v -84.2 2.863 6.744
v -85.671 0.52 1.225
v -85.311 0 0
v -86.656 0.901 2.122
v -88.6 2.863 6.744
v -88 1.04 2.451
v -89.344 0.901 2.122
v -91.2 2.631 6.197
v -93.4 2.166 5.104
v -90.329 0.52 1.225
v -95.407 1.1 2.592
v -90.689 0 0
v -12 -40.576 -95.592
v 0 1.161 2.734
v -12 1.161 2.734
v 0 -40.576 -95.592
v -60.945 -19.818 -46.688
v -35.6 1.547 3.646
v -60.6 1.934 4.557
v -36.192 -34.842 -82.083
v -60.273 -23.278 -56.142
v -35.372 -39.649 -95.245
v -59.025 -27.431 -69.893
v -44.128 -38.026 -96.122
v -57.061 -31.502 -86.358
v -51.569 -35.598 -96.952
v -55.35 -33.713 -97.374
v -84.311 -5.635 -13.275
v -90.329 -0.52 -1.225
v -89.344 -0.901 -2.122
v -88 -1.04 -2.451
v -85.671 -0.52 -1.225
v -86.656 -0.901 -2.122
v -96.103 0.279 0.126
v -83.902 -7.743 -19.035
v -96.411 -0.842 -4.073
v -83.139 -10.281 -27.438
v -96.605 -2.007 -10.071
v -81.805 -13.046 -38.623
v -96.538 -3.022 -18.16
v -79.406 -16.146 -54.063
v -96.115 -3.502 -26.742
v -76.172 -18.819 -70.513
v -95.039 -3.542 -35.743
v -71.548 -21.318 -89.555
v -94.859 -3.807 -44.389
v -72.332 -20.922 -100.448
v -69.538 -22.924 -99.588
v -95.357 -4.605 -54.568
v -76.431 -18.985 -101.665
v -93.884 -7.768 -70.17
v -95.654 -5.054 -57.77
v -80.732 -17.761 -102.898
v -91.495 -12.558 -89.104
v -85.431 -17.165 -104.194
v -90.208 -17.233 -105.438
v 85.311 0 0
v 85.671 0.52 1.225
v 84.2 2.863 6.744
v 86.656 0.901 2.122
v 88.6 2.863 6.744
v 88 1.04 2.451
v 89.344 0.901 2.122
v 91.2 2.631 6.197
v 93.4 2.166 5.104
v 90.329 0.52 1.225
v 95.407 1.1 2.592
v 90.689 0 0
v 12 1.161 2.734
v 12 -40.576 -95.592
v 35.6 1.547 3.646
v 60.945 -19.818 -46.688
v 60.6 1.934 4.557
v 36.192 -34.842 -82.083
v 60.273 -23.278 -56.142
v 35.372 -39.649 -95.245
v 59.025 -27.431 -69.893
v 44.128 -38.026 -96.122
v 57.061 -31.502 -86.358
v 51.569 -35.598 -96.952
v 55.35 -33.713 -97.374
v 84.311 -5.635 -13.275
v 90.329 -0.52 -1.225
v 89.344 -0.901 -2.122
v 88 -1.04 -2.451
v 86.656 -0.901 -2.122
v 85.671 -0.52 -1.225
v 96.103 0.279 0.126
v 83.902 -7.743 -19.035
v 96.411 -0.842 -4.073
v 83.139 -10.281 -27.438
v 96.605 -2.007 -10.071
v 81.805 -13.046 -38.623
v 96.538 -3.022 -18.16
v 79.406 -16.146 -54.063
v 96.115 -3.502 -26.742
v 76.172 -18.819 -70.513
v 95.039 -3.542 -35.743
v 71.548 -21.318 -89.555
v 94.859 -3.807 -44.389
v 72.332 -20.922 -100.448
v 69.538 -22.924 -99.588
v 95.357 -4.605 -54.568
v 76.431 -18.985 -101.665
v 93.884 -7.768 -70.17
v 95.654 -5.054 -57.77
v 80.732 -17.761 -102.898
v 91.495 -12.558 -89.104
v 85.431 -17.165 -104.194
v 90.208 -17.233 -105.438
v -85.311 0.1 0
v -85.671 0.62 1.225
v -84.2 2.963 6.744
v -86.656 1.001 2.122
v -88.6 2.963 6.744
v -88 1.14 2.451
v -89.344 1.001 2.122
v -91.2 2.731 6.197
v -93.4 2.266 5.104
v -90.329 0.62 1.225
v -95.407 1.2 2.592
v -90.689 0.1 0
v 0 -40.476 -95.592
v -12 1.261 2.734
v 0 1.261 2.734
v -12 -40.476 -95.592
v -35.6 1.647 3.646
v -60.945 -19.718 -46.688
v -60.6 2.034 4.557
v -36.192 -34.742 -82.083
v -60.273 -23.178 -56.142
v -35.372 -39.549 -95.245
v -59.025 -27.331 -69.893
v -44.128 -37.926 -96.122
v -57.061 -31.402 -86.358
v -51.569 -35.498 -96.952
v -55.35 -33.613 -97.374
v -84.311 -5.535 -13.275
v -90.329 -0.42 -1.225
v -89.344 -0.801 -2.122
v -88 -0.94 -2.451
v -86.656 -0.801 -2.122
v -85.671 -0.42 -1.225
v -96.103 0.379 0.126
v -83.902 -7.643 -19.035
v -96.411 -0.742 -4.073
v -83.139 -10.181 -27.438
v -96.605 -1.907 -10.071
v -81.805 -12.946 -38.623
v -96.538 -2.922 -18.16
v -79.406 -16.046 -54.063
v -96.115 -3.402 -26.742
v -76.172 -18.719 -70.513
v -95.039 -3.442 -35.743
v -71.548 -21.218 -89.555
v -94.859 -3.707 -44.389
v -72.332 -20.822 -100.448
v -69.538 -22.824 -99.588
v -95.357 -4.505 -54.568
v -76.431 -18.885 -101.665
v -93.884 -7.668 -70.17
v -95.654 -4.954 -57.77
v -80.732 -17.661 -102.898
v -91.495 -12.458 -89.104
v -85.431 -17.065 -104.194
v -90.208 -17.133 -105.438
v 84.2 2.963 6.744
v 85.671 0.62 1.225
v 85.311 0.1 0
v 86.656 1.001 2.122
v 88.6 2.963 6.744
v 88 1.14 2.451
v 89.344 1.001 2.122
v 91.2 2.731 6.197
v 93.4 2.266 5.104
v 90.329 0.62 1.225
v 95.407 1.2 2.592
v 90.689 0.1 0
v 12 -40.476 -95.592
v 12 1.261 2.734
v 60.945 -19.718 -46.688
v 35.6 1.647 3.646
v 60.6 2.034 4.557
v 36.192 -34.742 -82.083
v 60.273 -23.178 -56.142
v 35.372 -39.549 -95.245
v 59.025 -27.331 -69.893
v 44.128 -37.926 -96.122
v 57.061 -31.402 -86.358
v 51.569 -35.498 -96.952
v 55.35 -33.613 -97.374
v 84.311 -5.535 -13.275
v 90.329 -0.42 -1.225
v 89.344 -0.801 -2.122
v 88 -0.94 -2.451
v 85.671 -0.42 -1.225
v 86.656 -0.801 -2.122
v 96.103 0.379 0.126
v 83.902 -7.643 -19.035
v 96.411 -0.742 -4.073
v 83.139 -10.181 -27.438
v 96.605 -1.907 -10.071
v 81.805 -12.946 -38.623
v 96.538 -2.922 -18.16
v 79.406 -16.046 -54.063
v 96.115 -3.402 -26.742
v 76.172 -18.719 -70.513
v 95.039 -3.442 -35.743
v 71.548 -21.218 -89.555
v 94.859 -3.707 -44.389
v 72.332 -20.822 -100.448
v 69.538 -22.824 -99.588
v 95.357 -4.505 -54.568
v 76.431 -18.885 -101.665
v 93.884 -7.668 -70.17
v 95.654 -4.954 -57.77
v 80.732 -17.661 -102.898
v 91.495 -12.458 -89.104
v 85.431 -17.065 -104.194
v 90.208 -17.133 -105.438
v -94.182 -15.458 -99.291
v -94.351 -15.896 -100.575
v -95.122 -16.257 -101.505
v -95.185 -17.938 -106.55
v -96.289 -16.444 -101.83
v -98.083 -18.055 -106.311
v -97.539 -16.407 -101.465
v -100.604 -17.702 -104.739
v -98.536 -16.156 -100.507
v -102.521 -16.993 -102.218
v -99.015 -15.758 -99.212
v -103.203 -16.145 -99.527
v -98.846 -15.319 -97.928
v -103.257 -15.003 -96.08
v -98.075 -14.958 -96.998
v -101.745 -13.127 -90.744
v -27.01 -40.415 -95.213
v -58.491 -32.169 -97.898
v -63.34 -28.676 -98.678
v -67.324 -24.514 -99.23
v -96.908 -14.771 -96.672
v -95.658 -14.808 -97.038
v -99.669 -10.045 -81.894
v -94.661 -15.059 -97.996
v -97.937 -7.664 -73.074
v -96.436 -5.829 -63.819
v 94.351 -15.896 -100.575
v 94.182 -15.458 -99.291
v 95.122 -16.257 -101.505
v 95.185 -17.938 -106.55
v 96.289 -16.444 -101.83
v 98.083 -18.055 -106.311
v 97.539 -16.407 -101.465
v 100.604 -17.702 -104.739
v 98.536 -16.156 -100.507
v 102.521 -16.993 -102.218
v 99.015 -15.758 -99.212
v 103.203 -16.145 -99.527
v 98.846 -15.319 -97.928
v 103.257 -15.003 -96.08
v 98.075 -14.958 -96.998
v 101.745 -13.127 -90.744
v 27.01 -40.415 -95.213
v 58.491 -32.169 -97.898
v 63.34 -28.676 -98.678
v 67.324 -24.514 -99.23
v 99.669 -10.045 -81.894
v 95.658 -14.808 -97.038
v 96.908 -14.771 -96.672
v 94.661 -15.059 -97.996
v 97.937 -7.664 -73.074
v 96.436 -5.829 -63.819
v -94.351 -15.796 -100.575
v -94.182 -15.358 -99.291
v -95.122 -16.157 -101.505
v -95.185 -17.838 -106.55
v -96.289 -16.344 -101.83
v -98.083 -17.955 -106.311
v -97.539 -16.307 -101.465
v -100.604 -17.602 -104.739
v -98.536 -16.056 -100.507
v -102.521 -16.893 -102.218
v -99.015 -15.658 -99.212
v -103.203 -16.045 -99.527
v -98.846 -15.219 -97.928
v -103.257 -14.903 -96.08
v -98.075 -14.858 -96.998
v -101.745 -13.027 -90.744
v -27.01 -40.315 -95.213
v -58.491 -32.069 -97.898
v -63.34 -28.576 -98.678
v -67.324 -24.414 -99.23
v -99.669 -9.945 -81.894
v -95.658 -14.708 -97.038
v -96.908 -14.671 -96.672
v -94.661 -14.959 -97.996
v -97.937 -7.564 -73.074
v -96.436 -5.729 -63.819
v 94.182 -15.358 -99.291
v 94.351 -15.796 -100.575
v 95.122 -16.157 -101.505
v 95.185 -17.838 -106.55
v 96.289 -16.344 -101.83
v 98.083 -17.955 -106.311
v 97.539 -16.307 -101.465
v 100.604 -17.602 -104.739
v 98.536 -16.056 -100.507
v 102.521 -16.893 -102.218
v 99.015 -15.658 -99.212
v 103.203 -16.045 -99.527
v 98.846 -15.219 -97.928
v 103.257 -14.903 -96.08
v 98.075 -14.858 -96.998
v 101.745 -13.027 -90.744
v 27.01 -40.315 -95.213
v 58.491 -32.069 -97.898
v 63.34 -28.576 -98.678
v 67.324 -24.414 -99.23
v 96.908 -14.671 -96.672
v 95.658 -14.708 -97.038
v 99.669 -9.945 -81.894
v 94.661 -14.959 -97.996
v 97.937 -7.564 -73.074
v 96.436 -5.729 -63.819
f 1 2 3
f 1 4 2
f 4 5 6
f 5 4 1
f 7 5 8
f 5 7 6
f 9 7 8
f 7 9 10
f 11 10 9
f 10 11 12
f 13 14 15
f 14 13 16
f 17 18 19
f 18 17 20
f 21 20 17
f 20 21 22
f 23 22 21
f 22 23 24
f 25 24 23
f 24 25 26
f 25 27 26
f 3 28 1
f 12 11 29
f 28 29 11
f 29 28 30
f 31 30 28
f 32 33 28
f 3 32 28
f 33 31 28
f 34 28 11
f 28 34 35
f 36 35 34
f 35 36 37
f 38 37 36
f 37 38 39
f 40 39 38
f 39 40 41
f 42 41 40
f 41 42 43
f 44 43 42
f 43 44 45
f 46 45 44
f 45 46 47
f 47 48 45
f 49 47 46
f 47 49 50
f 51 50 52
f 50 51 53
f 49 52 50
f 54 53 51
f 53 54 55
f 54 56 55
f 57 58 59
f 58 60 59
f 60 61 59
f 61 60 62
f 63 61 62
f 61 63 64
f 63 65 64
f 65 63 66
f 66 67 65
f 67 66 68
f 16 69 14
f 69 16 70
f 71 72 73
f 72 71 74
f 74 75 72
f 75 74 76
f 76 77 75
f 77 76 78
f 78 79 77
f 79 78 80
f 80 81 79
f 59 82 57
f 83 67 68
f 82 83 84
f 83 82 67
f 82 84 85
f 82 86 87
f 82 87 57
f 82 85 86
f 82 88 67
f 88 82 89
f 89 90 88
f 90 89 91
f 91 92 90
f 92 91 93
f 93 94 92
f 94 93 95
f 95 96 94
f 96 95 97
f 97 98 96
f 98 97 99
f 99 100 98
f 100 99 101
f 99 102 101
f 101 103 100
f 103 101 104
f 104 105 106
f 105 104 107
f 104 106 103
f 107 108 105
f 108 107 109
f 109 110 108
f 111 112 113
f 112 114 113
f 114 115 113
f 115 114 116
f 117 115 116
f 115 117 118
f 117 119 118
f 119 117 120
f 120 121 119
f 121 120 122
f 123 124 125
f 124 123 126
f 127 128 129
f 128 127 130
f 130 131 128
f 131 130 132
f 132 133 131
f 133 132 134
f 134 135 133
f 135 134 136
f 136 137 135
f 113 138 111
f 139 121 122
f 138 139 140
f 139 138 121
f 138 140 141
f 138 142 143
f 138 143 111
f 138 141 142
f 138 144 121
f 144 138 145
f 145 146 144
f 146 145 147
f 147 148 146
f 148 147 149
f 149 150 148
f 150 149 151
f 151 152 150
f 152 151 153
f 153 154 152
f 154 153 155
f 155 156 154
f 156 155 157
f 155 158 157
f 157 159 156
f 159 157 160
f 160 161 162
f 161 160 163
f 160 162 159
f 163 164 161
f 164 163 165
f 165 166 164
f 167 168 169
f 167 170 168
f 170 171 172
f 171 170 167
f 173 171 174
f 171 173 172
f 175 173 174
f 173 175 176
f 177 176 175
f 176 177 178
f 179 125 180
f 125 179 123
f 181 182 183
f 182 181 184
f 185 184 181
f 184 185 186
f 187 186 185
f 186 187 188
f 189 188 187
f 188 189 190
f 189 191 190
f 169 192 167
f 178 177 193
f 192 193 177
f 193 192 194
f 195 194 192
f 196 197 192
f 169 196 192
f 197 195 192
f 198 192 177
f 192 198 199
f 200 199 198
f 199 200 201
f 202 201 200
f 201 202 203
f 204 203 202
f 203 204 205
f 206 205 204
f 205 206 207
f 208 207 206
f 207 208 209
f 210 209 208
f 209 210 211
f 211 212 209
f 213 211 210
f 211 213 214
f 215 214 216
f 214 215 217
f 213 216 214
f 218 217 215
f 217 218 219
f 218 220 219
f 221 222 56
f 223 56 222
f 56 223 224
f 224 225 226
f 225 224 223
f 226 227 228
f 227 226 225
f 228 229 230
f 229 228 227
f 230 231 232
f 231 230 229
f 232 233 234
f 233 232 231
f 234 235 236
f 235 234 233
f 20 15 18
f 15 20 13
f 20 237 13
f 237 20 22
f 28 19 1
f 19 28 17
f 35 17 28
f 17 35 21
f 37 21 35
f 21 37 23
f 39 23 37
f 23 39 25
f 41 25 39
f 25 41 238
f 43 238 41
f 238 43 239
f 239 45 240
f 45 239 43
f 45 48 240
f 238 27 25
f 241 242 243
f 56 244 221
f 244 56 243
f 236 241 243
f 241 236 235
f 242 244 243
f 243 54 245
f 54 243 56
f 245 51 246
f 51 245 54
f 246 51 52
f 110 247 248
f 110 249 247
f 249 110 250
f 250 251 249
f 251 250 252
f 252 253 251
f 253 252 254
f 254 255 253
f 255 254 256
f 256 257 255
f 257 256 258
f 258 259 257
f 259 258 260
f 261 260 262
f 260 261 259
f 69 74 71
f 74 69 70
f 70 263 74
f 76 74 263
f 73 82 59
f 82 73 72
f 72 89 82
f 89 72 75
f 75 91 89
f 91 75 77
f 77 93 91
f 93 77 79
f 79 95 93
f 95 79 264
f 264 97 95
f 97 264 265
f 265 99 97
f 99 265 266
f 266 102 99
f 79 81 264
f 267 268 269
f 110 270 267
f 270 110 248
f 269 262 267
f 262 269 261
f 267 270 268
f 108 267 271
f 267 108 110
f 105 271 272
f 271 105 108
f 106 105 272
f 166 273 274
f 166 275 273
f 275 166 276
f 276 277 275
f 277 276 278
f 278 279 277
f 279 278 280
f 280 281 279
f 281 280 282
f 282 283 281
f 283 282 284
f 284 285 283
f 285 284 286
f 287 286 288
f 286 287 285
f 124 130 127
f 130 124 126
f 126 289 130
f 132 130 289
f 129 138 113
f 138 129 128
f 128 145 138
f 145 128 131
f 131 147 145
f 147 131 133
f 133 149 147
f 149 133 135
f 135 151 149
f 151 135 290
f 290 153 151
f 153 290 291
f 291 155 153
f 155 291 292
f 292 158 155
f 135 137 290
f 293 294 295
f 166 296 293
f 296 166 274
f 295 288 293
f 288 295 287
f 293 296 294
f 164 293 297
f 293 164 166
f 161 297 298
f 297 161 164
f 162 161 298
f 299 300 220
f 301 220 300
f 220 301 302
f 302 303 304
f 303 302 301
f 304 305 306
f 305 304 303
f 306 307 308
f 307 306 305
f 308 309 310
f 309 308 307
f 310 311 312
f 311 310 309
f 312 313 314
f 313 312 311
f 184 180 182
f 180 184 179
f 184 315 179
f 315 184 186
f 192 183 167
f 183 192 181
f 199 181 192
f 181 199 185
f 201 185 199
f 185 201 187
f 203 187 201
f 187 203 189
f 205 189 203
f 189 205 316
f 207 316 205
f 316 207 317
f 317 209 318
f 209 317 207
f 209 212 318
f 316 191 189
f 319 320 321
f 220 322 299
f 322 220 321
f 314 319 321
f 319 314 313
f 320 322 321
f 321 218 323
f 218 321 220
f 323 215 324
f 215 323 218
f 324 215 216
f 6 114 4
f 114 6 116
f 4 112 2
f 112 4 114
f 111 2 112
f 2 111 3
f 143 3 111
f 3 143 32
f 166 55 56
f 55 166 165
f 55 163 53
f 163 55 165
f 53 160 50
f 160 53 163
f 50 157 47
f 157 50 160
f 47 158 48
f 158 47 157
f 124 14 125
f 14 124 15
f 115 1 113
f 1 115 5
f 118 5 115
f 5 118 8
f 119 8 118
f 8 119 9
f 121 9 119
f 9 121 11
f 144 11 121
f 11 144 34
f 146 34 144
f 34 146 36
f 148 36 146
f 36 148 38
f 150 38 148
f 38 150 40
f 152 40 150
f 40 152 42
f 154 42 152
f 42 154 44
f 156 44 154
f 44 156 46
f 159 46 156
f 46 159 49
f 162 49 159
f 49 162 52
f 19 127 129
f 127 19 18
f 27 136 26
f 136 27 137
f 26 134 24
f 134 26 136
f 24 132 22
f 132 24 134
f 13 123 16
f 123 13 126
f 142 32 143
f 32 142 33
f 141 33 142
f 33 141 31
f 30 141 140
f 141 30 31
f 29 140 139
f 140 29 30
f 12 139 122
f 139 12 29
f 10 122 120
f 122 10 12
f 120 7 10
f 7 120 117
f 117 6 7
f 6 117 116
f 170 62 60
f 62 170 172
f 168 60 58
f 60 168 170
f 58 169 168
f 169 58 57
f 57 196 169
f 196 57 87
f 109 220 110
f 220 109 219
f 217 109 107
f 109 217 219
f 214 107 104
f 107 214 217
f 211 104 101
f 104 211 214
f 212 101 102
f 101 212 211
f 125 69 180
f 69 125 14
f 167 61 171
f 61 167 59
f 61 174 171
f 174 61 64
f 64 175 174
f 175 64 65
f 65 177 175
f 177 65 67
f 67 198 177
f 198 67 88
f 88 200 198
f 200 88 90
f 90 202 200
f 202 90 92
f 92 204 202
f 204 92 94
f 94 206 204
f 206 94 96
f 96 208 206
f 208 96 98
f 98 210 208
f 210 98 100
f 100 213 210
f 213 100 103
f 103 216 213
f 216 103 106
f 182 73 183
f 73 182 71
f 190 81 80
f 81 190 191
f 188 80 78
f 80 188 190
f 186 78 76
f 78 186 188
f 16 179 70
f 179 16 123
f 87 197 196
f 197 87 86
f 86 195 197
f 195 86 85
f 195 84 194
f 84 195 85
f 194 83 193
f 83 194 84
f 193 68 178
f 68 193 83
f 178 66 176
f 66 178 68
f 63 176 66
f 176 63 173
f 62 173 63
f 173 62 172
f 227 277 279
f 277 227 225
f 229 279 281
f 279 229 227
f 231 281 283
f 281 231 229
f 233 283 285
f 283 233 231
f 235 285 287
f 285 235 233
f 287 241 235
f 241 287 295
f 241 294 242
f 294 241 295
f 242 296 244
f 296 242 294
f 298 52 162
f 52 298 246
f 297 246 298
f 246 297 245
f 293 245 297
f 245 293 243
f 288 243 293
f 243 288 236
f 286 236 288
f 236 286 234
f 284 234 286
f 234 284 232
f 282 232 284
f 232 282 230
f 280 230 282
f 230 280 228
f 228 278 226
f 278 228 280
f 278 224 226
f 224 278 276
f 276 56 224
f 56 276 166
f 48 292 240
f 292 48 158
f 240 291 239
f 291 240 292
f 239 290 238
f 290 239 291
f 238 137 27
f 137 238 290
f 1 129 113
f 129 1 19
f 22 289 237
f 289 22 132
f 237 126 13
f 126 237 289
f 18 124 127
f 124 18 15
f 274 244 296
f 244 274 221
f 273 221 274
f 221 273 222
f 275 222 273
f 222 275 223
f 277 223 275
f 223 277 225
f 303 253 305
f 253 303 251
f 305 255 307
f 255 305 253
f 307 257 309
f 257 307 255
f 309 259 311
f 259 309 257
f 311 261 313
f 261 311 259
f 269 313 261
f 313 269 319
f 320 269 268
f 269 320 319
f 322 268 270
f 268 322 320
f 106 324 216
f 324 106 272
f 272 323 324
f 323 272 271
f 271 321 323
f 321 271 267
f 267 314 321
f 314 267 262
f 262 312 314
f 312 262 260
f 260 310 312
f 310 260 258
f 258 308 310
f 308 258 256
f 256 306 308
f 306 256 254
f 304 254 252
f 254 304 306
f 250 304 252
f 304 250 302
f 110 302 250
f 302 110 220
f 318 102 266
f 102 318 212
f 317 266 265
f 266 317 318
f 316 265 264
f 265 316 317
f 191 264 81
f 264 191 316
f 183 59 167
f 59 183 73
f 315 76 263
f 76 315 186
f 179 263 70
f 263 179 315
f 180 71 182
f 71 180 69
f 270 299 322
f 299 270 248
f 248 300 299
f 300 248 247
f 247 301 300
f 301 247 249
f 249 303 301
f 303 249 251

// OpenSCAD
// file: ../p/rect2p.scad
use <../lib.scad>
function ldraw_lib__rect2p() = [
// 0 Rectangle with 2 Parallel Edges
// 0 Name: rect2p.dat
// 0 Author: Donald Sutter [technog]
// 0 !LDRAW_ORG Primitive UPDATE 2010-01
// 0 !LICENSE Licensed under CC BY 2.0 and CC BY 4.0 : see CAreadme.txt
// 
// 0 BFC CERTIFY CCW
  [0,"BFC","CERTIFY"],
  [0,"BFC","CCW"],
// 
// 0 !HISTORY 2003-08-01 [PTadmin] Official Update 2003-02
// 0 !HISTORY 2007-06-24 [PTadmin] Header formatted for Contributor Agreement
// 0 !HISTORY 2008-07-01 [PTadmin] Official Update 2008-01
// 0 !HISTORY 2010-01-17 [mikeheide] changed winding to CCW
// 0 !HISTORY 2010-04-05 [PTadmin] Official Update 2010-01
// 
// 
// 2 24 1 0 1 -1 0 1
  [2,24,1,0,1,-1,0,1],
// 2 24 -1 0 -1 1 0 -1
  [2,24,-1,0,-1,1,0,-1],
// 4 16 -1 0 1 -1 0 -1 1 0 -1 1 0 1
  [4,16,-1,0,1,-1,0,-1,1,0,-1,1,0,1],
// 0
];
module ldraw_lib__rect2p(step=0, col=false, unit=2/5, alt=false, line=0.2, solid=!$preview)
    makepoly(ldraw_lib__rect2p(), step=step, col=col, unit=unit, alt=alt, line=line, solid=solid);
ldraw_lib__rect2p(line=0.2);
// main file
use <../lib.scad>
use <s/u9495c02s01.scad>
use <s/u9495c02s02.scad>
use <s/u9495c02s03.scad>
use <s/u9495c02s04.scad>
function ldraw_lib__u9495p01c02() = [
// 0 Sail 30 x 15 Trapezoidal with Thick Stripes on White Background Pattern (Formed Shape 2)
// 0 Name: u9495p01c02.dat
// 0 Author: Philippe Hurbain [Philo]
// 0 !LDRAW_ORG Part UPDATE 2020-03
// 0 !LICENSE Licensed under CC BY 2.0 and CC BY 4.0 : see CAreadme.txt
// 
// 0 BFC CERTIFY CCW
  [0,"BFC","CERTIFY"],
  [0,"BFC","CCW"],
// 
// 0 !CATEGORY Sheet Fabric
// 0 !KEYWORDS set 6286, Skull's Eye Schooner
// 
// 0 !HISTORY 2020-12-29 [PTadmin] Official Update 2020-03
// 
// 
// 1 16 0 0 0 1 0 0 0 1 0 0 0 1 s\u9495c02s01.dat
  [1,16,0,0,0,1,0,0,0,1,0,0,0,1, ldraw_lib__s__u9495c02s01()],
// 1 16 0 0 0 -1 0 0 0 1 0 0 0 1 s\u9495c02s01.dat
  [1,16,0,0,0,-1,0,0,0,1,0,0,0,1, ldraw_lib__s__u9495c02s01()],
// 0 BFC INVERTNEXT
  [0,"BFC","INVERTNEXT"],
// 1 16 0 0 0.25 1 0 0 0 1 0 0 0 1 s\u9495c02s01.dat
  [1,16,0,0,0.25,1,0,0,0,1,0,0,0,1, ldraw_lib__s__u9495c02s01()],
// 0 BFC INVERTNEXT
  [0,"BFC","INVERTNEXT"],
// 1 16 0 0 0.25 -1 0 0 0 1 0 0 0 1 s\u9495c02s01.dat
  [1,16,0,0,0.25,-1,0,0,0,1,0,0,0,1, ldraw_lib__s__u9495c02s01()],
// 
// 1 15 0 0 0 1 0 0 0 1 0 0 0 1 s\u9495c02s02.dat
  [1,15,0,0,0,1,0,0,0,1,0,0,0,1, ldraw_lib__s__u9495c02s02()],
// 1 15 0 0 0 -1 0 0 0 1 0 0 0 1 s\u9495c02s02.dat
  [1,15,0,0,0,-1,0,0,0,1,0,0,0,1, ldraw_lib__s__u9495c02s02()],
// 0 BFC INVERTNEXT
  [0,"BFC","INVERTNEXT"],
// 1 15 0 0 0.25 1 0 0 0 1 0 0 0 1 s\u9495c02s02.dat
  [1,15,0,0,0.25,1,0,0,0,1,0,0,0,1, ldraw_lib__s__u9495c02s02()],
// 0 BFC INVERTNEXT
  [0,"BFC","INVERTNEXT"],
// 1 15 0 0 0.25 -1 0 0 0 1 0 0 0 1 s\u9495c02s02.dat
  [1,15,0,0,0.25,-1,0,0,0,1,0,0,0,1, ldraw_lib__s__u9495c02s02()],
// 
// 1 16 0 0 0 1 0 0 0 1 0 0 0 1 s\u9495c02s03.dat
  [1,16,0,0,0,1,0,0,0,1,0,0,0,1, ldraw_lib__s__u9495c02s03()],
// 1 16 0 0 0 -1 0 0 0 1 0 0 0 1 s\u9495c02s03.dat
  [1,16,0,0,0,-1,0,0,0,1,0,0,0,1, ldraw_lib__s__u9495c02s03()],
// 
// 1 15 0 0 0 1 0 0 0 1 0 0 0 1 s\u9495c02s04.dat
  [1,15,0,0,0,1,0,0,0,1,0,0,0,1, ldraw_lib__s__u9495c02s04()],
// 1 15 0 0 0 -1 0 0 0 1 0 0 0 1 s\u9495c02s04.dat
  [1,15,0,0,0,-1,0,0,0,1,0,0,0,1, ldraw_lib__s__u9495c02s04()],
];
module ldraw_lib__u9495p01c02(step=0, col=false, unit=2/5, alt=false, line=0.2, solid=!$preview)
    makepoly(ldraw_lib__u9495p01c02(), step=step, col=col, unit=unit, alt=alt, line=line, solid=solid);
ldraw_lib__u9495p01c02(line=0.2);
